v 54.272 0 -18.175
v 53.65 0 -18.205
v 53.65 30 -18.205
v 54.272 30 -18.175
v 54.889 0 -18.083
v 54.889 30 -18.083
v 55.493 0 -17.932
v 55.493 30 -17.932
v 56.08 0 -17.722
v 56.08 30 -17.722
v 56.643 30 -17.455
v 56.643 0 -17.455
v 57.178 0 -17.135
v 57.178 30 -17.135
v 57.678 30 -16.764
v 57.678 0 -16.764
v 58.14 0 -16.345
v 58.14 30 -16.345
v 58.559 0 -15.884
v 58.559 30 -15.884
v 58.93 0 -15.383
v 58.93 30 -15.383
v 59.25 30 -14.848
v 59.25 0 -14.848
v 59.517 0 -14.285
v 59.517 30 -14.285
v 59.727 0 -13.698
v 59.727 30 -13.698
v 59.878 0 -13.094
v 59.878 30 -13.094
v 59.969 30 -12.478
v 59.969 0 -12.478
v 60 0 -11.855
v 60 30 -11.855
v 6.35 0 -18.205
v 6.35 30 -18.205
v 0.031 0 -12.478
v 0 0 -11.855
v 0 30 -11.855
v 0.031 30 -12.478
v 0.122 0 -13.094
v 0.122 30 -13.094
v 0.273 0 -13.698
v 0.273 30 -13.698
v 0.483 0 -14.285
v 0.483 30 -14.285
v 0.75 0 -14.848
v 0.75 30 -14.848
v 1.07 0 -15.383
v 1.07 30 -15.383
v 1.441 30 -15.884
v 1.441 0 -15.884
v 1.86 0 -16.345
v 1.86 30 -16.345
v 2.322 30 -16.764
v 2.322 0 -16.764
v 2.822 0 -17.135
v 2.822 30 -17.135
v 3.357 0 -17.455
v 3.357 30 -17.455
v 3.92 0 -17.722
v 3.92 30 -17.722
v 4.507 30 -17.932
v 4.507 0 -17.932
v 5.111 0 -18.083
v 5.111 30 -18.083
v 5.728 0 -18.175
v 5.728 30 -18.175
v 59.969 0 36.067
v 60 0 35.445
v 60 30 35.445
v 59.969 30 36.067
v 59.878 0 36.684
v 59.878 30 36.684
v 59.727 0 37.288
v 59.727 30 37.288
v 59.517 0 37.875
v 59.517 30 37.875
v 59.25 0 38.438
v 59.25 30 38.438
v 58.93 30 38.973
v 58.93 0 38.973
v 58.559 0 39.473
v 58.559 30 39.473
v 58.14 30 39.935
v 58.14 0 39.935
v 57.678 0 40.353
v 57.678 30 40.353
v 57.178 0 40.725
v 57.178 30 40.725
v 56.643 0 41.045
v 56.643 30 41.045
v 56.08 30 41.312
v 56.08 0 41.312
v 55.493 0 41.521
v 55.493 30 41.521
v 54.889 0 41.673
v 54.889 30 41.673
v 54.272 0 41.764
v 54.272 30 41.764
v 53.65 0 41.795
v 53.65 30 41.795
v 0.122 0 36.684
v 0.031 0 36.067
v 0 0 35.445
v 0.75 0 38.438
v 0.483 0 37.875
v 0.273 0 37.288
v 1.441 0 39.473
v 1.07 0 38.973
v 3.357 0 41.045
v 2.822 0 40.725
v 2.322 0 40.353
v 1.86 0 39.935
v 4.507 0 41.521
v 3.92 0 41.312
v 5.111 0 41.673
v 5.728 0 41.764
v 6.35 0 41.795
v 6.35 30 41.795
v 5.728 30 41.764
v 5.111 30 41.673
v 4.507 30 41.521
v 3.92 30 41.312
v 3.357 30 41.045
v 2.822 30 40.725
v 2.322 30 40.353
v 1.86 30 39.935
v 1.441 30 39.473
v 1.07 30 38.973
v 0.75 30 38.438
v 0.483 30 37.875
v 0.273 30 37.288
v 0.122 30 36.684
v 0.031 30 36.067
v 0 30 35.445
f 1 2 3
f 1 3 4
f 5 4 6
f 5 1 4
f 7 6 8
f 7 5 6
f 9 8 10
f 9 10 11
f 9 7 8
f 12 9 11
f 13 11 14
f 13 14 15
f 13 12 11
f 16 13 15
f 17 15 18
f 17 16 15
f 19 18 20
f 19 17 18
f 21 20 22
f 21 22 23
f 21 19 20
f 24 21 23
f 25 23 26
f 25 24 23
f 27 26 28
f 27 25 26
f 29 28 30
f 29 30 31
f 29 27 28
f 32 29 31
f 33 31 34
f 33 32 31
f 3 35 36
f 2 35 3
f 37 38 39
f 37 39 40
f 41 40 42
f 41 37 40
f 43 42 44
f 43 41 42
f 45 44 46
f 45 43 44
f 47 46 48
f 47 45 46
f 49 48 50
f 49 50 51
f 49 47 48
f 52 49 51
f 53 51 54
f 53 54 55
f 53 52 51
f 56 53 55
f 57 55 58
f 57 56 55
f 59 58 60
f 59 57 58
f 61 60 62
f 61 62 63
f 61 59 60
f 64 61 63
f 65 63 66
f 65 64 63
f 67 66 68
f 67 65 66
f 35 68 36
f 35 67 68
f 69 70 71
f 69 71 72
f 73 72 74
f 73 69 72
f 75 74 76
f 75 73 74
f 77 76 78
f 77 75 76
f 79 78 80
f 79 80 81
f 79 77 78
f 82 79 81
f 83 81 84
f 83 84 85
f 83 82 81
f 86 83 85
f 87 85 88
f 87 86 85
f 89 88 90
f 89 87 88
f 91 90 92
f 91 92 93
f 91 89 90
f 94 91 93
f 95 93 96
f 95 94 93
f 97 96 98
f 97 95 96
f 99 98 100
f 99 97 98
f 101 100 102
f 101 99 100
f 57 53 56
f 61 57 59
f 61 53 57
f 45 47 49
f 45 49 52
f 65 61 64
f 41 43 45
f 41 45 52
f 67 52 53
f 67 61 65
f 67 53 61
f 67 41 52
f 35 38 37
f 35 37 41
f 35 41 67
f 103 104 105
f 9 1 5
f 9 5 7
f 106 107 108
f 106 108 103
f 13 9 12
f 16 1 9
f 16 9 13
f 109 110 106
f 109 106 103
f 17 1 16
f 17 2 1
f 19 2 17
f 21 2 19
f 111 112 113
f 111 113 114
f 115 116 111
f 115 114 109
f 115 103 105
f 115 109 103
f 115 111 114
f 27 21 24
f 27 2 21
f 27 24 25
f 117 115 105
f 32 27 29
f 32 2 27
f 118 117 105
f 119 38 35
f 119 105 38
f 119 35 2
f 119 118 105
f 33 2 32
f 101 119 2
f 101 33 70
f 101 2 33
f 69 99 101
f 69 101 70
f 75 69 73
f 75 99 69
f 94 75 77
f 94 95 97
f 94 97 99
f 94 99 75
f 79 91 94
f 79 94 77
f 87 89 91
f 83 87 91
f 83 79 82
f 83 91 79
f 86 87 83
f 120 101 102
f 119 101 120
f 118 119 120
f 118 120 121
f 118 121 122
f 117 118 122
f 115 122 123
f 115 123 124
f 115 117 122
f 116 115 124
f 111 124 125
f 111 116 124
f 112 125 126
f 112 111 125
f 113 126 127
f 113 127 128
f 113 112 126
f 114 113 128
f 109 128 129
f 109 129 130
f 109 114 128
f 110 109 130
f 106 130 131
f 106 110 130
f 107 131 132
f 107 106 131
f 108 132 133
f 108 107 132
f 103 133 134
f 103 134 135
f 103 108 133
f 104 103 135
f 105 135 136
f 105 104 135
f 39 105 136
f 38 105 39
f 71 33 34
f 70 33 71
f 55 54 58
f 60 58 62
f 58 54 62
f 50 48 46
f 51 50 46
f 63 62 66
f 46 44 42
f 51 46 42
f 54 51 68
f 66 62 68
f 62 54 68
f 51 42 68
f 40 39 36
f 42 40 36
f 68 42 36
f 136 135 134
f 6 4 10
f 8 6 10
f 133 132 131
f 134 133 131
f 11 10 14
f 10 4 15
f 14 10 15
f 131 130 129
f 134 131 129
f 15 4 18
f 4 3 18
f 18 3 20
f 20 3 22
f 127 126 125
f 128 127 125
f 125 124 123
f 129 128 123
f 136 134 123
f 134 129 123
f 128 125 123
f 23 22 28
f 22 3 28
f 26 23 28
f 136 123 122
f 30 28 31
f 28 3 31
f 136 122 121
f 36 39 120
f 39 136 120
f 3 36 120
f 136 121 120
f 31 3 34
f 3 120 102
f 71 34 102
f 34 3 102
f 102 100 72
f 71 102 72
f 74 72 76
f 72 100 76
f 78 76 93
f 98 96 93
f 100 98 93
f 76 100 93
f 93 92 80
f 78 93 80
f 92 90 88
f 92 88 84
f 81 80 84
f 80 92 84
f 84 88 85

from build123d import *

# Parameters (mm, degrees)
F1_DEPTH = 30


with BuildPart() as f1:
    # F0 (on Front) → F1 (new body)
    with BuildSketch(Plane.XZ):
        with BuildLine():
            Line((53.65, 41.79488), (6.35, 41.79488))
            ThreePointArc((6.35, 41.79488), (1.859872, 39.935008), (0, 35.44488))
            Line((0, 35.44488), (0, -11.85512))
            ThreePointArc((0, -11.85512), (1.859872, -16.345248), (6.35, -18.20512))
            Line((6.35, -18.20512), (53.65, -18.20512))
            ThreePointArc((53.65, -18.20512), (58.140128, -16.345248), (60, -11.85512))
            Line((60, -11.85512), (60, 35.44488))
            ThreePointArc((60, 35.44488), (58.140128, 39.935008), (53.65, 41.79488))
        make_face()
    extrude(amount=-F1_DEPTH)


solid = f1.part
